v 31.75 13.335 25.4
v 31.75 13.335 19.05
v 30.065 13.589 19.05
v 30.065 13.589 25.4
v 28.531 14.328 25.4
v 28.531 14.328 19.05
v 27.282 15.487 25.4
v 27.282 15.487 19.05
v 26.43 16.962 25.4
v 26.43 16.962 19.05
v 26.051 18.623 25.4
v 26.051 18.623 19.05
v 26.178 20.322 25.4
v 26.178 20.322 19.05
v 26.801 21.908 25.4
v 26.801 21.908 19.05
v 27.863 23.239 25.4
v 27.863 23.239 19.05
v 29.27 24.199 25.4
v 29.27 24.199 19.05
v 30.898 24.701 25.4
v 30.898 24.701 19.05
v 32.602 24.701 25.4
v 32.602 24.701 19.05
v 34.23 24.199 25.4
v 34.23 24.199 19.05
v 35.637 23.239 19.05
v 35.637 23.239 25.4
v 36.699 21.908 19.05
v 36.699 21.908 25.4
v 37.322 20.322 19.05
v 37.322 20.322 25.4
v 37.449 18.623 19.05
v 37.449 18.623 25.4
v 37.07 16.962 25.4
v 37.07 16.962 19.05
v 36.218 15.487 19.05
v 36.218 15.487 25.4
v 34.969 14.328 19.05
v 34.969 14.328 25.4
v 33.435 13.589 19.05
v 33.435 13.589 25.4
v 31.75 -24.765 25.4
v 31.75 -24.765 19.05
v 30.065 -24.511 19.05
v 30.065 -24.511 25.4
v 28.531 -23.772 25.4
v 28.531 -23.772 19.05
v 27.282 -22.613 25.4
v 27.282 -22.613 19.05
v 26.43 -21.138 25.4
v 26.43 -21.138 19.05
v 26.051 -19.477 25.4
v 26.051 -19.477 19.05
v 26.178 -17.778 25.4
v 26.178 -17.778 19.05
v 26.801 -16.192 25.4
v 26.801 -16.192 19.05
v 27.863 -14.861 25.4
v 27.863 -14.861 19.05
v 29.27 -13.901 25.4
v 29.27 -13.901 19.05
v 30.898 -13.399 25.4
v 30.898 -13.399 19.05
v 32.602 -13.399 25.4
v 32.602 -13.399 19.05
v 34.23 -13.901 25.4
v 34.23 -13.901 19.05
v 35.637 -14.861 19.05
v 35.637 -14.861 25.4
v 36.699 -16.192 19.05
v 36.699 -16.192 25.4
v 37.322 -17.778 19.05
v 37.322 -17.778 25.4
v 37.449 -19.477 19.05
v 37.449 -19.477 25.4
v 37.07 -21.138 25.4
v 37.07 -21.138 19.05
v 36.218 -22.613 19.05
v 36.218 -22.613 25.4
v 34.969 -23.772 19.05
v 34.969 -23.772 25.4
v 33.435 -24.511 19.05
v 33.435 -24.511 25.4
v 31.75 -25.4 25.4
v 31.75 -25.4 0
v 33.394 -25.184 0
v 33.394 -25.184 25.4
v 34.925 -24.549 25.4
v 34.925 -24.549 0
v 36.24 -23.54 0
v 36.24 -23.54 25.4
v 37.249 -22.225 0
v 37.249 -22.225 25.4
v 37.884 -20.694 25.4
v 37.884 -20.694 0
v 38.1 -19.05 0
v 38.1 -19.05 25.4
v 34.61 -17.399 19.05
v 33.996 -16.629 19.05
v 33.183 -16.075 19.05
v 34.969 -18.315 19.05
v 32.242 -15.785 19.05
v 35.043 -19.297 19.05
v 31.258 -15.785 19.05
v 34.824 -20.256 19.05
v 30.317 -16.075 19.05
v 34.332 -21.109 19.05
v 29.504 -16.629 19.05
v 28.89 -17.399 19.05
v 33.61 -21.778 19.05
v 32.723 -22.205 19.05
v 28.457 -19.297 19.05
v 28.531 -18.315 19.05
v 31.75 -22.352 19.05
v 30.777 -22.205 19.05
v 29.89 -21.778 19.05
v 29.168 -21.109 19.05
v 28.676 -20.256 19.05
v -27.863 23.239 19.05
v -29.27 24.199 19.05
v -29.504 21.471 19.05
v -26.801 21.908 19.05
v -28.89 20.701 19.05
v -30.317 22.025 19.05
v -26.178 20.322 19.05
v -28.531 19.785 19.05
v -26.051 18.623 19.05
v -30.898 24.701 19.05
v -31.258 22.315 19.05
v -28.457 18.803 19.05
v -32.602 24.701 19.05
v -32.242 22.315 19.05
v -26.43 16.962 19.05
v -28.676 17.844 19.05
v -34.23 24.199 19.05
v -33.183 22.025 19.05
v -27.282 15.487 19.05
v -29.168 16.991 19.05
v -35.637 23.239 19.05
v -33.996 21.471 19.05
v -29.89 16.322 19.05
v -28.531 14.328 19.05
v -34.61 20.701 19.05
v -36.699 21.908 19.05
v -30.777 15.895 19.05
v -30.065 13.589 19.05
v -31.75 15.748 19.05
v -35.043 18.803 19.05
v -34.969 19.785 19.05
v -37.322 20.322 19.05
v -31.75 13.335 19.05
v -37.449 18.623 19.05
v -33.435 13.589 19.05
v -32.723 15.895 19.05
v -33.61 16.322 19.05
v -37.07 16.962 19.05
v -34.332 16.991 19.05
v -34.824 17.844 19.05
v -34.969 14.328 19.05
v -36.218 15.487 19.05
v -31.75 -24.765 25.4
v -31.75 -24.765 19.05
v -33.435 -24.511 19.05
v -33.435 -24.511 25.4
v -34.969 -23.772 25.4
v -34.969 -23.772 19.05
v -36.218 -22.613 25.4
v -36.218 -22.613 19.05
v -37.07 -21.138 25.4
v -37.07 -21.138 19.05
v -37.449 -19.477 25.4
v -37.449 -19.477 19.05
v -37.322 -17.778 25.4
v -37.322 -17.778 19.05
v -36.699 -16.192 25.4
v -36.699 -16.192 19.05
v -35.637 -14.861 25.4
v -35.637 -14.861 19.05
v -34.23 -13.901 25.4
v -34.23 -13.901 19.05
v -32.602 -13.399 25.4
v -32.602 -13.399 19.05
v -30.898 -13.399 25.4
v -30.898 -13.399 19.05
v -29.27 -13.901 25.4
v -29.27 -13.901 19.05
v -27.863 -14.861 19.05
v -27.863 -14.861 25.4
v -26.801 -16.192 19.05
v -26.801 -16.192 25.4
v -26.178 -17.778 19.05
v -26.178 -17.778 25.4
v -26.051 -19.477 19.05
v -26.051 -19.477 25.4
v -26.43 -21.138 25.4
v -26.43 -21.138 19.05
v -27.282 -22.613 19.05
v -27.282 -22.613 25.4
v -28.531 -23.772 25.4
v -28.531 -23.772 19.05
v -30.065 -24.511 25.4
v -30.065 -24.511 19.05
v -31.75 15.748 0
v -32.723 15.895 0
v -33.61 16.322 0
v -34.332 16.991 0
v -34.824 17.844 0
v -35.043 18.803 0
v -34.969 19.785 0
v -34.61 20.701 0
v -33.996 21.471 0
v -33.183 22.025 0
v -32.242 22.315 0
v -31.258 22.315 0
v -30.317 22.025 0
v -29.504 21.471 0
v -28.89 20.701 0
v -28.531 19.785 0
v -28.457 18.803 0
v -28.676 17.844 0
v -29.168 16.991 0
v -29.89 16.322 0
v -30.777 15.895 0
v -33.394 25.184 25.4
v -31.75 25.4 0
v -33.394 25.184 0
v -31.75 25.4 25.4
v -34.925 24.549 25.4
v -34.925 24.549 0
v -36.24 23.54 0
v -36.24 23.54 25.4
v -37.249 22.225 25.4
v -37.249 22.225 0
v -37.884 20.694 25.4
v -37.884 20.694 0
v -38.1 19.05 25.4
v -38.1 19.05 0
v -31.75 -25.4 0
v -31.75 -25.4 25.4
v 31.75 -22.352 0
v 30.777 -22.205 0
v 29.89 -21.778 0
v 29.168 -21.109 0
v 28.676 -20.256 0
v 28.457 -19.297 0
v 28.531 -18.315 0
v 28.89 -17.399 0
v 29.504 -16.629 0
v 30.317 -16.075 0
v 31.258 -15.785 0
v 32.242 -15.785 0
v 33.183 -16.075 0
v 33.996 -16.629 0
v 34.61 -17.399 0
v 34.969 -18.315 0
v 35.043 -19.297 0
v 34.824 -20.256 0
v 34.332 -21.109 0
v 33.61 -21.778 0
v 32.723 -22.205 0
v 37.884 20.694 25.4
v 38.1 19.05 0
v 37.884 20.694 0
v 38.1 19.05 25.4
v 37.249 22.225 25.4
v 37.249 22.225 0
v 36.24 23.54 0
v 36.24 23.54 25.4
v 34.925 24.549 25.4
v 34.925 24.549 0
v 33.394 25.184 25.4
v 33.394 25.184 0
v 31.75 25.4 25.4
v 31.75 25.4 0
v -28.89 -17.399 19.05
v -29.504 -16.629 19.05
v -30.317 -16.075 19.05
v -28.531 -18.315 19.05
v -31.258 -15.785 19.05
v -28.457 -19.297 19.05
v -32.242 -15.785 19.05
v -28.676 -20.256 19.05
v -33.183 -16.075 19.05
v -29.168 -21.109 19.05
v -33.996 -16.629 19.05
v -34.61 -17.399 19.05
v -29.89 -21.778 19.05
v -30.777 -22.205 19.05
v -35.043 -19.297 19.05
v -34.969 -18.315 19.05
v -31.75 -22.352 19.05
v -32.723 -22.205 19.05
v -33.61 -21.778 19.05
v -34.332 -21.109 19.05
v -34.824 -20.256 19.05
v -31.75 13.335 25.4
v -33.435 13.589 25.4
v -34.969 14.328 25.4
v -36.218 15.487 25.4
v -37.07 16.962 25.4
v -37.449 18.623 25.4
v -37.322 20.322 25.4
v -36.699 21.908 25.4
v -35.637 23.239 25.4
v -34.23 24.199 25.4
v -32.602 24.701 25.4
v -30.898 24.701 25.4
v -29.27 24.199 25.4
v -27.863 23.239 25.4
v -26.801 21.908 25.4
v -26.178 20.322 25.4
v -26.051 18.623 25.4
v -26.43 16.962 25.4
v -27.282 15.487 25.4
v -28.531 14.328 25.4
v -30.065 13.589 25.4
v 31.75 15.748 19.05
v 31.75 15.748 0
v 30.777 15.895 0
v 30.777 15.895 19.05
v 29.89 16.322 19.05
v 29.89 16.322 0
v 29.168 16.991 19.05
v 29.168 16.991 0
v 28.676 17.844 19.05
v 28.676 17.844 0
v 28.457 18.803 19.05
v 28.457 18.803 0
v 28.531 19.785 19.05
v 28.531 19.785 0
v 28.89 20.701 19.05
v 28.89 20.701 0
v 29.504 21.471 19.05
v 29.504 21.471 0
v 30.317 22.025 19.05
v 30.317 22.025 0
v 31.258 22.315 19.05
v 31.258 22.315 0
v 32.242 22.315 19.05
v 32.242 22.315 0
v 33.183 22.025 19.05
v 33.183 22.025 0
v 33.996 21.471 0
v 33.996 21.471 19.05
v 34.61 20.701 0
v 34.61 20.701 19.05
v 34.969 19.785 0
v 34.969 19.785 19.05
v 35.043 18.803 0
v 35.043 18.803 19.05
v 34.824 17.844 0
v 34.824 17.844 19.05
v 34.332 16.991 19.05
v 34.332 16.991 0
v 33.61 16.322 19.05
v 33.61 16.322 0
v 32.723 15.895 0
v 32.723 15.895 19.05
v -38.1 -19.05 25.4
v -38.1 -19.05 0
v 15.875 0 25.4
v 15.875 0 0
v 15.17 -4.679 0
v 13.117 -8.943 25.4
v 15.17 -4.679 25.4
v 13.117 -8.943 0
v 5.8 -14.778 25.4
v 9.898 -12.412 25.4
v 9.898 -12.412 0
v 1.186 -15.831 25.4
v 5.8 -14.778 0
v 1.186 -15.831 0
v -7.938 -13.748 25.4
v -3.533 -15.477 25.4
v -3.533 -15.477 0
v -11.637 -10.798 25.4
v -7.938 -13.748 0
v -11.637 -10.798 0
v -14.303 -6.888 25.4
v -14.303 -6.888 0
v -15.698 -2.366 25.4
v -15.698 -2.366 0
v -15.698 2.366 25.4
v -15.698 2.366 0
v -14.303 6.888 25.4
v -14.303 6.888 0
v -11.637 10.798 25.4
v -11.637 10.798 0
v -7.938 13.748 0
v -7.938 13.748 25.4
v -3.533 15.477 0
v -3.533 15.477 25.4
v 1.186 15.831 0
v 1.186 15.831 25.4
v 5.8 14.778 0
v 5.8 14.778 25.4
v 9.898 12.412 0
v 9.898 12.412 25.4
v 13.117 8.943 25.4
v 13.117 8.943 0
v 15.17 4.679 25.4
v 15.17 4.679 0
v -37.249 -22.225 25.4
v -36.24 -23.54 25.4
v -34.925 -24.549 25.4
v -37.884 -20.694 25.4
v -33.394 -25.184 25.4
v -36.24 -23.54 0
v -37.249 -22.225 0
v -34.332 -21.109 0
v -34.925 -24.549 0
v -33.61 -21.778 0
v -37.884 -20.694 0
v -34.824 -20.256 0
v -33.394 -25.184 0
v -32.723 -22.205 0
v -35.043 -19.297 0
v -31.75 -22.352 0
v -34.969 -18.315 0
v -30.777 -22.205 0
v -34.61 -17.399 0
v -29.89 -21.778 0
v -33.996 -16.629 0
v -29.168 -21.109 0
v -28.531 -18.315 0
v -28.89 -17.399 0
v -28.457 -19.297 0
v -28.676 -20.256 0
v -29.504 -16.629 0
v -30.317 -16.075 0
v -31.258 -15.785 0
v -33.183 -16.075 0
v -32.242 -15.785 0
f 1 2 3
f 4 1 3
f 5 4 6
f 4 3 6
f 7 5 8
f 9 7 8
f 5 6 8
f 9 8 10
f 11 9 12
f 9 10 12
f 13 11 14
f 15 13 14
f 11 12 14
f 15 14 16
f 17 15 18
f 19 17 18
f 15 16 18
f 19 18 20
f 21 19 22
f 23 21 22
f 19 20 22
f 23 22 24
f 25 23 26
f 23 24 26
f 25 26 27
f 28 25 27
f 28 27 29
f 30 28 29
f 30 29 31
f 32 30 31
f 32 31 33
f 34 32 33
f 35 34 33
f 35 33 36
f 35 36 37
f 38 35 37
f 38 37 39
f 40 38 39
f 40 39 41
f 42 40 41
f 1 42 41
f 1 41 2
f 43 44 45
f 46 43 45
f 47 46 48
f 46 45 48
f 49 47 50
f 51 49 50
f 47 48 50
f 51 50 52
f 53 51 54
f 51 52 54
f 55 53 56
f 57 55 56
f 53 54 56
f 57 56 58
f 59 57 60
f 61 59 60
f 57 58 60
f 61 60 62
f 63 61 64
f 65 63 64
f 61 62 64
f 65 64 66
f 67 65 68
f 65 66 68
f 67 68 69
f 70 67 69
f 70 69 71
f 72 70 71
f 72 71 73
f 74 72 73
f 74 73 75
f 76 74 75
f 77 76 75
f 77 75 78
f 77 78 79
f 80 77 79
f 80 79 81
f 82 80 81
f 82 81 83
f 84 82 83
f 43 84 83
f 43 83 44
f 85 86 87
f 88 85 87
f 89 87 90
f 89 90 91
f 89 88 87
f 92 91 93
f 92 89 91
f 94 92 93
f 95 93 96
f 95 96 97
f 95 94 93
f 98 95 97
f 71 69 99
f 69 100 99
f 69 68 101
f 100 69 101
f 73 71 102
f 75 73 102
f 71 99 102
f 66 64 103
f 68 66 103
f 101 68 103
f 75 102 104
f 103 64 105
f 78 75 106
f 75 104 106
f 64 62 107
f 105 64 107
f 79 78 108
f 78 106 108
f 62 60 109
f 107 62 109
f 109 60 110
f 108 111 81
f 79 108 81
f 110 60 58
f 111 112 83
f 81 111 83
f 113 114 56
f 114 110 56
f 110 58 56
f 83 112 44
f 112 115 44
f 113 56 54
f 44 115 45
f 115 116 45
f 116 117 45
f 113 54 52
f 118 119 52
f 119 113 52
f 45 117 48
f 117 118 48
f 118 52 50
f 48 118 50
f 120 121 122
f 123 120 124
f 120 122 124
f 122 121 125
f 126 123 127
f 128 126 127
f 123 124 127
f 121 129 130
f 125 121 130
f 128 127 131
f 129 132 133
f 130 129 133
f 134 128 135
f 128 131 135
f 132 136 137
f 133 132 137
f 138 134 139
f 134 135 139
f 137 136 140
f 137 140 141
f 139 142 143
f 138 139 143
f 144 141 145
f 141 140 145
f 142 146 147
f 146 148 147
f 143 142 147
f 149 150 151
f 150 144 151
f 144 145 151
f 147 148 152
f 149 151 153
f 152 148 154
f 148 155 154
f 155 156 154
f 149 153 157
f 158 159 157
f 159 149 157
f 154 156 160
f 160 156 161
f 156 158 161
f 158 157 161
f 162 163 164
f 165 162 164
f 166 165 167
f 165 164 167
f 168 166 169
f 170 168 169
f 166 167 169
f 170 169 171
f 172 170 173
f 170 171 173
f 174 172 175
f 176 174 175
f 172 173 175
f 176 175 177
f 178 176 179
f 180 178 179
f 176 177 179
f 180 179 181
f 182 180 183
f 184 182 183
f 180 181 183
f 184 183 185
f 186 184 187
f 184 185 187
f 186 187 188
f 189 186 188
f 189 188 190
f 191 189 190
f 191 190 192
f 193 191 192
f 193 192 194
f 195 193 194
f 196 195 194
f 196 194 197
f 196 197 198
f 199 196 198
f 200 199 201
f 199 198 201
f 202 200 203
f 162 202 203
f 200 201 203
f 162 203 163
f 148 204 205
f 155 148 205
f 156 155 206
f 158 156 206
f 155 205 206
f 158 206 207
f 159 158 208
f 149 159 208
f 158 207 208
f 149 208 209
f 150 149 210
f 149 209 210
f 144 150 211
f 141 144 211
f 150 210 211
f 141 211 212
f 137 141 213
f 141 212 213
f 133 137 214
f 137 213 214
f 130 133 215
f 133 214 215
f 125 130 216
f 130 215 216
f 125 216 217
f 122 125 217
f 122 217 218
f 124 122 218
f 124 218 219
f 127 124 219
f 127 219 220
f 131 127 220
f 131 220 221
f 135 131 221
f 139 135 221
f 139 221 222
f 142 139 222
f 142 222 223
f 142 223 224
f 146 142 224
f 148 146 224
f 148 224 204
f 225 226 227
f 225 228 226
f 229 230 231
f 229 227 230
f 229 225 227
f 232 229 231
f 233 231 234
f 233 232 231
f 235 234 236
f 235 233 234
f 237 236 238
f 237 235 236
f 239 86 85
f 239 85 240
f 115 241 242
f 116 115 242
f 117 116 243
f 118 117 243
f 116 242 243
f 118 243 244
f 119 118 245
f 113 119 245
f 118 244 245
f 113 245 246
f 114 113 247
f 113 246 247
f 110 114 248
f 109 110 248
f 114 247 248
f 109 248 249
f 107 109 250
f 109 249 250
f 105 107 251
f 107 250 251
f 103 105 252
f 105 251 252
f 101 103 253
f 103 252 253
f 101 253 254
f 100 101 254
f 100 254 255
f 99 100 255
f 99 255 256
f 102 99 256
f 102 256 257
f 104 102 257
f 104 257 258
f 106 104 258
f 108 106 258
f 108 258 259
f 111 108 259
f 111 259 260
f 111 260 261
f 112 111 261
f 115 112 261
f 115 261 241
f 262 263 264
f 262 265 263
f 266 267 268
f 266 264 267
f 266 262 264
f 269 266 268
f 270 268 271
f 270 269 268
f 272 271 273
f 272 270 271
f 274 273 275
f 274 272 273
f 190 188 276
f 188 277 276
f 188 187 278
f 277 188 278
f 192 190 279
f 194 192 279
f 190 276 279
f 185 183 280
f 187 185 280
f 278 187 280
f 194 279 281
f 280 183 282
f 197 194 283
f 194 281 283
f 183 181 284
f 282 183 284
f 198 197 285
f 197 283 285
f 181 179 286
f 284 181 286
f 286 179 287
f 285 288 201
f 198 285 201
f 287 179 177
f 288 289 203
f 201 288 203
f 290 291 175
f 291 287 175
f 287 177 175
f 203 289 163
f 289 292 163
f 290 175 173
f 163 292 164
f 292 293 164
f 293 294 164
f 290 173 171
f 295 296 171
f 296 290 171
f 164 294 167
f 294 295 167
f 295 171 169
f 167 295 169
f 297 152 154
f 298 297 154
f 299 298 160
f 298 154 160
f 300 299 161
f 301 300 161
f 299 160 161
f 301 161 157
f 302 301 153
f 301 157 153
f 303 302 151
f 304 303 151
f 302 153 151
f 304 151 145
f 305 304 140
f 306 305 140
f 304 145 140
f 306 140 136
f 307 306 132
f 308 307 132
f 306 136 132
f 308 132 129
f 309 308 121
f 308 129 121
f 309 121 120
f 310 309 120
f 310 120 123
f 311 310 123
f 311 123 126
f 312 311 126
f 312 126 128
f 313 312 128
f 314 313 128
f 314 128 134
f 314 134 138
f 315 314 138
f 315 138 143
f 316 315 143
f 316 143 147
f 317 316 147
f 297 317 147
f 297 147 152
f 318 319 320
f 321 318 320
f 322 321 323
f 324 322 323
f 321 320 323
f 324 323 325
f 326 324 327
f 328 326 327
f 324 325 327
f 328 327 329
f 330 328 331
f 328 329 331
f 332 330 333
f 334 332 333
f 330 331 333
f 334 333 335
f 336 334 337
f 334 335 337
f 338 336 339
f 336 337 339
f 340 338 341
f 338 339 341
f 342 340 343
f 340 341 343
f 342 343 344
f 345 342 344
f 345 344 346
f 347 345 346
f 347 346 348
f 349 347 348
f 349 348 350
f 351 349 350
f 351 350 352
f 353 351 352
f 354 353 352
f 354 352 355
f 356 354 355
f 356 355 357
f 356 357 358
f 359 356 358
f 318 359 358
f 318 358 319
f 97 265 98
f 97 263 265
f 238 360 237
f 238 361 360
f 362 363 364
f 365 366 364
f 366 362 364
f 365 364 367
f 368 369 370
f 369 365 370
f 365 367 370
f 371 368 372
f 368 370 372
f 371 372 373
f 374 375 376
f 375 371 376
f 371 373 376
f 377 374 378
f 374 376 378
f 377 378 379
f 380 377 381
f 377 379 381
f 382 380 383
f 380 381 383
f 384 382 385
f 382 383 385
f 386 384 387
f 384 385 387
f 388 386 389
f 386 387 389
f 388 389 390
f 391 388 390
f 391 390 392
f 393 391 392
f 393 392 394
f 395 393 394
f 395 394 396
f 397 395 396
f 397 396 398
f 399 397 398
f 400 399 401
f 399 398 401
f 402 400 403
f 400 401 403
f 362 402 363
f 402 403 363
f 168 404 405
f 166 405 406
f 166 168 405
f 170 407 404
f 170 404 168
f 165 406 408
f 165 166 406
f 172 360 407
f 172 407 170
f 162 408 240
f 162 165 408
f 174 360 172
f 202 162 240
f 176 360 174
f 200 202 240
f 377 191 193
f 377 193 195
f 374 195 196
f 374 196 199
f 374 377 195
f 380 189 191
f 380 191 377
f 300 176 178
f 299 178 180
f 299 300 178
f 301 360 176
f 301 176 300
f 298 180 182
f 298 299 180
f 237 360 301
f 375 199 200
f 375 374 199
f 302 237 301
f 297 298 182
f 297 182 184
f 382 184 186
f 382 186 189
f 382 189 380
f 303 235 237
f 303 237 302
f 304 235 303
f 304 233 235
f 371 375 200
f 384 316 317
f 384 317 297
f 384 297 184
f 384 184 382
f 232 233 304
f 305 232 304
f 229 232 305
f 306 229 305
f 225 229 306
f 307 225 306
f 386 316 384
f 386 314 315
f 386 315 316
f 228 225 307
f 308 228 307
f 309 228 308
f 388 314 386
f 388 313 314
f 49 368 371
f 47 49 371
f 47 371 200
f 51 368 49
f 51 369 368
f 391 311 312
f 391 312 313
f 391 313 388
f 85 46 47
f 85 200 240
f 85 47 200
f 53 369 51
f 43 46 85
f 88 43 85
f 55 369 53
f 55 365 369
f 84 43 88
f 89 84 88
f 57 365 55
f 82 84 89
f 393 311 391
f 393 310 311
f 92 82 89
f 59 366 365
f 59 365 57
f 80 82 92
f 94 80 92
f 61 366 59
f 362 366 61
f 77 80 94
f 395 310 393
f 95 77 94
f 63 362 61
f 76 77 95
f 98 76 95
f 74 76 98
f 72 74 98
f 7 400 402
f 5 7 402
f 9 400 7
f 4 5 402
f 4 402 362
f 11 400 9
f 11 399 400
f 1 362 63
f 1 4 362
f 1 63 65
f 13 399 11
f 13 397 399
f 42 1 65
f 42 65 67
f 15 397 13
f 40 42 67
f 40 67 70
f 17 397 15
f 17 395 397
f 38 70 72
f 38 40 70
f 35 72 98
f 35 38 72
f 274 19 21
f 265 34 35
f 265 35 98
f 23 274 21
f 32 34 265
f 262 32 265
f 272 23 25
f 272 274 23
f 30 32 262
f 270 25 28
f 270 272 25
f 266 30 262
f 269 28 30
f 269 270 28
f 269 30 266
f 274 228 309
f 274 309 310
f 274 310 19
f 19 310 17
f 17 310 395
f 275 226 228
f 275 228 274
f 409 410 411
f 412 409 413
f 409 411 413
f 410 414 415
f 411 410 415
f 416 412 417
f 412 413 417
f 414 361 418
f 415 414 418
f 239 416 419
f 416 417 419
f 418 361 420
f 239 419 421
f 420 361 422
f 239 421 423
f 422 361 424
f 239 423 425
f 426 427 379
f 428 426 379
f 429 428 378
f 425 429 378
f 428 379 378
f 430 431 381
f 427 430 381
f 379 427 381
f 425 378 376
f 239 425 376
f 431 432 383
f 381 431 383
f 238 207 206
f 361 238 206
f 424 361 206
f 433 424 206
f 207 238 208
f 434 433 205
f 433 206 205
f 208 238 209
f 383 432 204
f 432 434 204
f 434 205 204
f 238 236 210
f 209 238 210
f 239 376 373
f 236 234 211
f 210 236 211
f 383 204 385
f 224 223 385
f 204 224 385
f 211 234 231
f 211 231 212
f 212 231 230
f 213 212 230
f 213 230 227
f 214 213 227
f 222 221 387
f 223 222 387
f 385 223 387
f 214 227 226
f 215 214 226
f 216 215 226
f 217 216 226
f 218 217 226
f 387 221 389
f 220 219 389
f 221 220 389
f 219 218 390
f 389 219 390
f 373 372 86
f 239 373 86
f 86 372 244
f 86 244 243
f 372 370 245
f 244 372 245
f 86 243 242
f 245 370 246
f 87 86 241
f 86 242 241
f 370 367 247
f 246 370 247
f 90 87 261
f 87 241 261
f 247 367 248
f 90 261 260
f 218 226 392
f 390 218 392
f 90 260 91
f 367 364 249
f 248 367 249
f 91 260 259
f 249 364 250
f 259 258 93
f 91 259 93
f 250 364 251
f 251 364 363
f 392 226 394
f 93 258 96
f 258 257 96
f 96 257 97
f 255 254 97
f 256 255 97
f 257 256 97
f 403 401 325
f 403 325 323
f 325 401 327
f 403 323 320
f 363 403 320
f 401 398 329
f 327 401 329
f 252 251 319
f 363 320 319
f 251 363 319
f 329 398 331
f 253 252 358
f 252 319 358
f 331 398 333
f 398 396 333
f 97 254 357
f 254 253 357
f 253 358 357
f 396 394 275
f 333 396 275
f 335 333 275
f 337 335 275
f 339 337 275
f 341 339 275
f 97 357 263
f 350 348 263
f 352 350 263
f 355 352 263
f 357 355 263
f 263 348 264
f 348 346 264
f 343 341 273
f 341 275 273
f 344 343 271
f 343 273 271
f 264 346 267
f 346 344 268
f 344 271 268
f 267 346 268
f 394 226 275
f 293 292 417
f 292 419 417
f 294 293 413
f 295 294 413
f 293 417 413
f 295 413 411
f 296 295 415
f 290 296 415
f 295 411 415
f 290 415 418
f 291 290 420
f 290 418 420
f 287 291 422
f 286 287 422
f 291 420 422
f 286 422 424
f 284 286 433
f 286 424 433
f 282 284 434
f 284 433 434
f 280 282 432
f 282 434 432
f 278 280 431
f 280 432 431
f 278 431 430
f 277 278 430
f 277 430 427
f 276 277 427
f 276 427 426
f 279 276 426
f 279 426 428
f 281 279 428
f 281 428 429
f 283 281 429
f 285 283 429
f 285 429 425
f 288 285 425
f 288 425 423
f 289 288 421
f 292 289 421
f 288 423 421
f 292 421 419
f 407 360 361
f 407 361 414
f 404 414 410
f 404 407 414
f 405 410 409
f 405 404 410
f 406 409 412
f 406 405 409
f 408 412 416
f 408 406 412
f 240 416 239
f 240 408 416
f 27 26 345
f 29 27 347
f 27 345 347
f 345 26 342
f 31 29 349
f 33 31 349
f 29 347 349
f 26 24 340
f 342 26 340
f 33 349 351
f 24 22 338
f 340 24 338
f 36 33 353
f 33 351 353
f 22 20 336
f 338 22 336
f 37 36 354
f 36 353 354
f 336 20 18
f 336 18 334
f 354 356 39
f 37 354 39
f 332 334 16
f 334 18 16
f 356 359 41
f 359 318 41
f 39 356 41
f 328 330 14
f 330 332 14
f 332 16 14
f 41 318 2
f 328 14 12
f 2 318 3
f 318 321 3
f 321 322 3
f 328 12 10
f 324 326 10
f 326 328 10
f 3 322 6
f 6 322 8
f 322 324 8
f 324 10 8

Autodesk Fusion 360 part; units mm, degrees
sketch "Sketch1" plane through (0, 0, 0) normal (0, 0, 1) x (1, 0, 0)
  line L0 (38.1, -25.4) -> (-38.1, -25.4)
  line L1 (-38.1, -25.4) -> (-38.1, 25.4)
  line L2 (-38.1, 25.4) -> (38.1, 25.4)
  line L3 (38.1, 25.4) -> (38.1, -25.4)
  line L4 (38.1, -25.4) -> (-38.1, 25.4) construction
  line L5 (-38.1, -25.4) -> (38.1, 25.4) construction
  circle A0 centre (0, 0) radius 15.875
  dimension "d1" = 76.2
  dimension "d2" = 50.8
  dimension "d3" = 31.75
extrude "Extrude1" add sketch "Sketch1" along normal blind 25.4
fillet "Fillet1" radius 6.35 4 edges at (38.1, 25.4, 12.7) (38.1, -25.4, 12.7) (-38.1, -25.4, 12.7) (-38.1, 25.4, 12.7)
sketch "Sketch2" plane through (0, 0, 25.4) normal (0, 0, 1) x (-1, 0, 0)
  circle A0 centre (0, 0) radius 15.875
  arc A1 (31.75, -25.4) -> (38.1, -19.05) centre (31.75, -19.05) ccw
  line L0 (38.1, -19.05) -> (38.1, 19.05)
  arc A2 (38.1, 19.05) -> (31.75, 25.4) centre (31.75, 19.05) ccw
  line L1 (31.75, 25.4) -> (-31.75, 25.4)
  arc A3 (-31.75, 25.4) -> (-38.1, 19.05) centre (-31.75, 19.05) ccw
  line L2 (-38.1, 19.05) -> (-38.1, -19.05)
  arc A4 (-38.1, -19.05) -> (-31.75, -25.4) centre (-31.75, -19.05) ccw
  line L3 (-31.75, -25.4) -> (31.75, -25.4)
  point P0 (31.75, -19.05)
  point P1 (-31.75, -19.05)
  point P2 (-31.75, 19.05)
  point P3 (31.75, 19.05)
hole "Hole1" at (-31.75, 19.05, 25.4) at (-31.75, -19.05, 25.4) at (31.75, -19.05, 25.4) at (31.75, 19.05, 25.4) direction (0, 0, -1) diameter 6.604 end through all counterbore diameter 11.43 counterbore depth 6.35
